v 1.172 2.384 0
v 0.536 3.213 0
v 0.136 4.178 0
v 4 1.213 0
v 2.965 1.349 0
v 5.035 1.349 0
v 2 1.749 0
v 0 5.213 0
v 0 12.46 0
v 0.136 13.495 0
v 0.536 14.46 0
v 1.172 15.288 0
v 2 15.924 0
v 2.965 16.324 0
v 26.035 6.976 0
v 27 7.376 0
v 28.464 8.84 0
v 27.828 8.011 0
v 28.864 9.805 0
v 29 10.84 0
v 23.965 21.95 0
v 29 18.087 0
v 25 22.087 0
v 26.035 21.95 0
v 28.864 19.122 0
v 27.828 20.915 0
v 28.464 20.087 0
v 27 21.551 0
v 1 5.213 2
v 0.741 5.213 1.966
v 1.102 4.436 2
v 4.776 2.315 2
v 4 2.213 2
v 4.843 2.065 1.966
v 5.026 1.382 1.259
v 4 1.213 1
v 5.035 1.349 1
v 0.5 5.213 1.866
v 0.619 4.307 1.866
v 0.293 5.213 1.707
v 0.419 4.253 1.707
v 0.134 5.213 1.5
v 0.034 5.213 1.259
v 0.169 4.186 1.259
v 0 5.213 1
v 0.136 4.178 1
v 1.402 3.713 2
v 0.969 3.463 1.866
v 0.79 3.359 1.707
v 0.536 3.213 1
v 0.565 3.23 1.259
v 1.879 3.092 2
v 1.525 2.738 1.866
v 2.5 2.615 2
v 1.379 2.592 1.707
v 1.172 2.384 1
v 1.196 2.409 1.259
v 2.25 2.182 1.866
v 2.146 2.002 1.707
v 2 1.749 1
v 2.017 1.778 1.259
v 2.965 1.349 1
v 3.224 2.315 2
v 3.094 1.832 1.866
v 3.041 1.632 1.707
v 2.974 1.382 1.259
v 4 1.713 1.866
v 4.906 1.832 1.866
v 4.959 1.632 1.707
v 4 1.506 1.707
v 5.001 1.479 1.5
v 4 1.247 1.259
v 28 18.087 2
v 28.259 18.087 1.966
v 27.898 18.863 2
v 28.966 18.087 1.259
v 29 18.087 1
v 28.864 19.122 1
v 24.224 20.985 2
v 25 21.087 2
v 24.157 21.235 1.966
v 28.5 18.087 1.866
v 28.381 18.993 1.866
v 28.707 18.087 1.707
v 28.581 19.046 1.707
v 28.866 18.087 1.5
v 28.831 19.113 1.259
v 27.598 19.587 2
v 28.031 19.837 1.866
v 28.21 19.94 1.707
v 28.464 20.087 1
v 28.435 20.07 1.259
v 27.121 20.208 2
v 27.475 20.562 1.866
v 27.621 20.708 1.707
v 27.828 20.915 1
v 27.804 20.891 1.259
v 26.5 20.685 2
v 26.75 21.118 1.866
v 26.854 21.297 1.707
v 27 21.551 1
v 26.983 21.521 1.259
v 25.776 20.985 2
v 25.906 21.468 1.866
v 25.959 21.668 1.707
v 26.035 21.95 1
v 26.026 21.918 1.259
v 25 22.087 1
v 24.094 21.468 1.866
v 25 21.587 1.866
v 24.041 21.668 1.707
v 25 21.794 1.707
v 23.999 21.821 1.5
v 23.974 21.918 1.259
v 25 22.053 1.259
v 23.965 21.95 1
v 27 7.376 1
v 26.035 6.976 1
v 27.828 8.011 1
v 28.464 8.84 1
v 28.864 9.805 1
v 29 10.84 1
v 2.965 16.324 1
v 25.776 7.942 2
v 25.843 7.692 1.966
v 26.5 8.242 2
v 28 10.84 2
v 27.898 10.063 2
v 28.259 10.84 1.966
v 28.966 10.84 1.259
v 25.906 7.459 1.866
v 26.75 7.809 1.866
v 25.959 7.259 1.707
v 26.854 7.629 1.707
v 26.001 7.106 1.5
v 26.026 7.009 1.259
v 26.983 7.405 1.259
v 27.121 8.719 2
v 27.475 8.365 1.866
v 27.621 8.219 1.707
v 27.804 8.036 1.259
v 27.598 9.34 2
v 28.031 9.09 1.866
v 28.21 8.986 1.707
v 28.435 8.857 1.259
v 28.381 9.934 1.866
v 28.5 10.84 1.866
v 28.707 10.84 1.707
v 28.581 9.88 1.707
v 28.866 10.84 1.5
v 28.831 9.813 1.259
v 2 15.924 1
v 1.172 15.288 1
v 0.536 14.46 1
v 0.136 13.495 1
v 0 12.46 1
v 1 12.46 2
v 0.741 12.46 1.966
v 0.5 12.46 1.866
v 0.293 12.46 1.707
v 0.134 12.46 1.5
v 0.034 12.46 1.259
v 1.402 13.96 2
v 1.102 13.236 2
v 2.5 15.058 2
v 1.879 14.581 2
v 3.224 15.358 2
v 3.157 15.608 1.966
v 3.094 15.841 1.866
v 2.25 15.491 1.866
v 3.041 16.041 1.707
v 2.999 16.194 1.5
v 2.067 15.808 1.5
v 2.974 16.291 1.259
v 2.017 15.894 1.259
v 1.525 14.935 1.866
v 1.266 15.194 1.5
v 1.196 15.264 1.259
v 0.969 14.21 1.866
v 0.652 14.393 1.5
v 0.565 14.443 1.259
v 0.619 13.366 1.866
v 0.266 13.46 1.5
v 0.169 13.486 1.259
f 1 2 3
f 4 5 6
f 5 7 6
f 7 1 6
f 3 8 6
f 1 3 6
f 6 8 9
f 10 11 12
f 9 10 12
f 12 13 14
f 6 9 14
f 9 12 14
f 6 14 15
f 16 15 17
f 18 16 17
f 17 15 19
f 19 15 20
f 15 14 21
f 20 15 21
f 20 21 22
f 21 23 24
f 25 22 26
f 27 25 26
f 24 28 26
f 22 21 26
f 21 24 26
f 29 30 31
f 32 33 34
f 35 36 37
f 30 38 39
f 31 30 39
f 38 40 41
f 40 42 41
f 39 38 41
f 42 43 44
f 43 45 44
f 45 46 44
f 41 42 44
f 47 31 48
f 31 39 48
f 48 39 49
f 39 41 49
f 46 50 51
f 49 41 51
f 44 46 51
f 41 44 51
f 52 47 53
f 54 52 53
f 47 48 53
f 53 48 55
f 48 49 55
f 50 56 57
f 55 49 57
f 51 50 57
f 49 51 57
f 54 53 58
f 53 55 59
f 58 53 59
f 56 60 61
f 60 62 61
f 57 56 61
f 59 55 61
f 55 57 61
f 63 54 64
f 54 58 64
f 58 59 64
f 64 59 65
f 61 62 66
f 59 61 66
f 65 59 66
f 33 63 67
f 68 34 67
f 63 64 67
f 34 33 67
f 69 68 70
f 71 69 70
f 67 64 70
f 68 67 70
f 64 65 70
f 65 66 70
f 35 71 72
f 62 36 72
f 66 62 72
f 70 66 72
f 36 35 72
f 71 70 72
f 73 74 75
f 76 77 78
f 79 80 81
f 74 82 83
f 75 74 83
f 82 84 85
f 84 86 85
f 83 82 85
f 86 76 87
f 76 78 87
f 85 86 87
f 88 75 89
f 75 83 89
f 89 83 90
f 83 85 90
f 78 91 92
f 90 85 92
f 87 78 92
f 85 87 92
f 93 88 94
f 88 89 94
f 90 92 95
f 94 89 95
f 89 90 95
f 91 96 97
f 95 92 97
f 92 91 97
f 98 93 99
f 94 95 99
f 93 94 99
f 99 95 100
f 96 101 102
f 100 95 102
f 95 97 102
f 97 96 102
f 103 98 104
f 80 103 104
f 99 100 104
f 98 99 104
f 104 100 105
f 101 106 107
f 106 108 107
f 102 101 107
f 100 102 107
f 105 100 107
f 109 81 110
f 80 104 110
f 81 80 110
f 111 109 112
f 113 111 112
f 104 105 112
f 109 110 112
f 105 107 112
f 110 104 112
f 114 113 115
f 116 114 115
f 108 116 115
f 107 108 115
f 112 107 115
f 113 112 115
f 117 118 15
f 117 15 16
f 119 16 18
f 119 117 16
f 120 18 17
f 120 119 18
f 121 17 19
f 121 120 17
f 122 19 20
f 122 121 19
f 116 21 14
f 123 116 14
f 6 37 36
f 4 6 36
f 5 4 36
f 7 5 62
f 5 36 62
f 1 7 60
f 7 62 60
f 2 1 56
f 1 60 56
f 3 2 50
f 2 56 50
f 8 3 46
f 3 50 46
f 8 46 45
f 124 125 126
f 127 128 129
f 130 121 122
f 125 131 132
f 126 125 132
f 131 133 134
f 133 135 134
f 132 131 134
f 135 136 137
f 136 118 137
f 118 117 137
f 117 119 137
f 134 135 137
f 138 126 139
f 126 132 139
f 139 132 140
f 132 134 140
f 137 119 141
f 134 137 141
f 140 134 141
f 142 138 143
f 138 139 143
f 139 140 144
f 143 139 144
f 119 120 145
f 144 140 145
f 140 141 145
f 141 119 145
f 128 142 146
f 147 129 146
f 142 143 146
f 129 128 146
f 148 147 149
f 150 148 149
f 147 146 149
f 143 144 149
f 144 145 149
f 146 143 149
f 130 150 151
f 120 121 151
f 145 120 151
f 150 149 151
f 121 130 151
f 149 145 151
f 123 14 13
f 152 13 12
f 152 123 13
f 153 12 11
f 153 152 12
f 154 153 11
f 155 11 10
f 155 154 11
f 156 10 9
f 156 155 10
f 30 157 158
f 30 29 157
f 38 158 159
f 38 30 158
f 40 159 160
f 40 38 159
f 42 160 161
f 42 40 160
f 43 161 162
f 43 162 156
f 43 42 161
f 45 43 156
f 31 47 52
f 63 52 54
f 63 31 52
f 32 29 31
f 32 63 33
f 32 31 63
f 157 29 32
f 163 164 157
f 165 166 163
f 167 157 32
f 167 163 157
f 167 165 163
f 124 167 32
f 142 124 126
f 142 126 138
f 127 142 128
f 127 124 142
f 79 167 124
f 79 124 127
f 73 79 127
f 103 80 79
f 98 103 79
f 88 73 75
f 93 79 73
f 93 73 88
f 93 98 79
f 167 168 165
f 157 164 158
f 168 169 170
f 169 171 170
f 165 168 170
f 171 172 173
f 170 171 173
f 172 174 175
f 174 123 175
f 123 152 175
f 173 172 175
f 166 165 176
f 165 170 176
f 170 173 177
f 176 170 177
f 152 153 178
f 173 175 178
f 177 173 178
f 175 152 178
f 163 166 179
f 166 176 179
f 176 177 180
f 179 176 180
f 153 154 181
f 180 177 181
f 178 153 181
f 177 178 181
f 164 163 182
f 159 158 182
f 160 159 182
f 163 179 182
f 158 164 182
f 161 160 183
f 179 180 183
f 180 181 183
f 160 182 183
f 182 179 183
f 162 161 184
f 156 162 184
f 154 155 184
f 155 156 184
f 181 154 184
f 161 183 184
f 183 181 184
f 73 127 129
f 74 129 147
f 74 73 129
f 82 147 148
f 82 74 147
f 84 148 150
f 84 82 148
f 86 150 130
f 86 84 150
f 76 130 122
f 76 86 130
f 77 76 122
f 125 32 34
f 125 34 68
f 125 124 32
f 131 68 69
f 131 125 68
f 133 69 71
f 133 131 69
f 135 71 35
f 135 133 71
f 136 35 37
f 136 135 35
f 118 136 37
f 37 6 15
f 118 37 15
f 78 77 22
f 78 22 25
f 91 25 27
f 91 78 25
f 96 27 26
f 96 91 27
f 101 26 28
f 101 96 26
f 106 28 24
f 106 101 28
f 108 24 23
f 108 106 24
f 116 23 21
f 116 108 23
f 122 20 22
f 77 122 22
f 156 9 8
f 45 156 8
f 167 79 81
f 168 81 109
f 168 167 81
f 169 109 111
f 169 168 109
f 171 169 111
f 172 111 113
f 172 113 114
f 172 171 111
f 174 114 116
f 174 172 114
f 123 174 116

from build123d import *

# Parameters (mm, degrees)
EXTRUDE_1_DEPTH = 2
FILLET_1_R      = 4
FILLET_2_R      = 1


with BuildPart() as part:
    # Эскиз1 → Бобышка-Вытянуть1 (new body)
    with BuildSketch(Plane.XY):
        Polygon((0, 0), (29, 7.770526581), (29, 23.299669287), (0, 15.529142706), align=None)
    extrude(amount=EXTRUDE_1_DEPTH)

    # Скругление1
    fillet_1_edges = [part.edges().sort_by_distance(p)[0] for p in [
        (0, 15.529142706, 1),
        (29, 23.299669287, 1),
        (29, 7.770526581, 1),
        (0, 0, 1),
    ]]
    fillet(fillet_1_edges, radius=FILLET_1_R)

    # Скругление2
    fillet_2_edges = [part.edges().sort_by_distance(p)[0] for p in [
        (0, 8.836368123, 2),
        (13.46472382, 19.13700458, 2),
        (15.53527618, 4.162664707, 2),
        (29, 14.463301164, 2),
        (27.435045716, 21.260181156, 2),
        (28.173413361, 8.404788816, 2),
        (1.564954284, 2.03948813, 2),
        (0.826586639, 14.89488047, 2),
    ]]
    fillet(fillet_2_edges, radius=FILLET_2_R)


solid = part.part
